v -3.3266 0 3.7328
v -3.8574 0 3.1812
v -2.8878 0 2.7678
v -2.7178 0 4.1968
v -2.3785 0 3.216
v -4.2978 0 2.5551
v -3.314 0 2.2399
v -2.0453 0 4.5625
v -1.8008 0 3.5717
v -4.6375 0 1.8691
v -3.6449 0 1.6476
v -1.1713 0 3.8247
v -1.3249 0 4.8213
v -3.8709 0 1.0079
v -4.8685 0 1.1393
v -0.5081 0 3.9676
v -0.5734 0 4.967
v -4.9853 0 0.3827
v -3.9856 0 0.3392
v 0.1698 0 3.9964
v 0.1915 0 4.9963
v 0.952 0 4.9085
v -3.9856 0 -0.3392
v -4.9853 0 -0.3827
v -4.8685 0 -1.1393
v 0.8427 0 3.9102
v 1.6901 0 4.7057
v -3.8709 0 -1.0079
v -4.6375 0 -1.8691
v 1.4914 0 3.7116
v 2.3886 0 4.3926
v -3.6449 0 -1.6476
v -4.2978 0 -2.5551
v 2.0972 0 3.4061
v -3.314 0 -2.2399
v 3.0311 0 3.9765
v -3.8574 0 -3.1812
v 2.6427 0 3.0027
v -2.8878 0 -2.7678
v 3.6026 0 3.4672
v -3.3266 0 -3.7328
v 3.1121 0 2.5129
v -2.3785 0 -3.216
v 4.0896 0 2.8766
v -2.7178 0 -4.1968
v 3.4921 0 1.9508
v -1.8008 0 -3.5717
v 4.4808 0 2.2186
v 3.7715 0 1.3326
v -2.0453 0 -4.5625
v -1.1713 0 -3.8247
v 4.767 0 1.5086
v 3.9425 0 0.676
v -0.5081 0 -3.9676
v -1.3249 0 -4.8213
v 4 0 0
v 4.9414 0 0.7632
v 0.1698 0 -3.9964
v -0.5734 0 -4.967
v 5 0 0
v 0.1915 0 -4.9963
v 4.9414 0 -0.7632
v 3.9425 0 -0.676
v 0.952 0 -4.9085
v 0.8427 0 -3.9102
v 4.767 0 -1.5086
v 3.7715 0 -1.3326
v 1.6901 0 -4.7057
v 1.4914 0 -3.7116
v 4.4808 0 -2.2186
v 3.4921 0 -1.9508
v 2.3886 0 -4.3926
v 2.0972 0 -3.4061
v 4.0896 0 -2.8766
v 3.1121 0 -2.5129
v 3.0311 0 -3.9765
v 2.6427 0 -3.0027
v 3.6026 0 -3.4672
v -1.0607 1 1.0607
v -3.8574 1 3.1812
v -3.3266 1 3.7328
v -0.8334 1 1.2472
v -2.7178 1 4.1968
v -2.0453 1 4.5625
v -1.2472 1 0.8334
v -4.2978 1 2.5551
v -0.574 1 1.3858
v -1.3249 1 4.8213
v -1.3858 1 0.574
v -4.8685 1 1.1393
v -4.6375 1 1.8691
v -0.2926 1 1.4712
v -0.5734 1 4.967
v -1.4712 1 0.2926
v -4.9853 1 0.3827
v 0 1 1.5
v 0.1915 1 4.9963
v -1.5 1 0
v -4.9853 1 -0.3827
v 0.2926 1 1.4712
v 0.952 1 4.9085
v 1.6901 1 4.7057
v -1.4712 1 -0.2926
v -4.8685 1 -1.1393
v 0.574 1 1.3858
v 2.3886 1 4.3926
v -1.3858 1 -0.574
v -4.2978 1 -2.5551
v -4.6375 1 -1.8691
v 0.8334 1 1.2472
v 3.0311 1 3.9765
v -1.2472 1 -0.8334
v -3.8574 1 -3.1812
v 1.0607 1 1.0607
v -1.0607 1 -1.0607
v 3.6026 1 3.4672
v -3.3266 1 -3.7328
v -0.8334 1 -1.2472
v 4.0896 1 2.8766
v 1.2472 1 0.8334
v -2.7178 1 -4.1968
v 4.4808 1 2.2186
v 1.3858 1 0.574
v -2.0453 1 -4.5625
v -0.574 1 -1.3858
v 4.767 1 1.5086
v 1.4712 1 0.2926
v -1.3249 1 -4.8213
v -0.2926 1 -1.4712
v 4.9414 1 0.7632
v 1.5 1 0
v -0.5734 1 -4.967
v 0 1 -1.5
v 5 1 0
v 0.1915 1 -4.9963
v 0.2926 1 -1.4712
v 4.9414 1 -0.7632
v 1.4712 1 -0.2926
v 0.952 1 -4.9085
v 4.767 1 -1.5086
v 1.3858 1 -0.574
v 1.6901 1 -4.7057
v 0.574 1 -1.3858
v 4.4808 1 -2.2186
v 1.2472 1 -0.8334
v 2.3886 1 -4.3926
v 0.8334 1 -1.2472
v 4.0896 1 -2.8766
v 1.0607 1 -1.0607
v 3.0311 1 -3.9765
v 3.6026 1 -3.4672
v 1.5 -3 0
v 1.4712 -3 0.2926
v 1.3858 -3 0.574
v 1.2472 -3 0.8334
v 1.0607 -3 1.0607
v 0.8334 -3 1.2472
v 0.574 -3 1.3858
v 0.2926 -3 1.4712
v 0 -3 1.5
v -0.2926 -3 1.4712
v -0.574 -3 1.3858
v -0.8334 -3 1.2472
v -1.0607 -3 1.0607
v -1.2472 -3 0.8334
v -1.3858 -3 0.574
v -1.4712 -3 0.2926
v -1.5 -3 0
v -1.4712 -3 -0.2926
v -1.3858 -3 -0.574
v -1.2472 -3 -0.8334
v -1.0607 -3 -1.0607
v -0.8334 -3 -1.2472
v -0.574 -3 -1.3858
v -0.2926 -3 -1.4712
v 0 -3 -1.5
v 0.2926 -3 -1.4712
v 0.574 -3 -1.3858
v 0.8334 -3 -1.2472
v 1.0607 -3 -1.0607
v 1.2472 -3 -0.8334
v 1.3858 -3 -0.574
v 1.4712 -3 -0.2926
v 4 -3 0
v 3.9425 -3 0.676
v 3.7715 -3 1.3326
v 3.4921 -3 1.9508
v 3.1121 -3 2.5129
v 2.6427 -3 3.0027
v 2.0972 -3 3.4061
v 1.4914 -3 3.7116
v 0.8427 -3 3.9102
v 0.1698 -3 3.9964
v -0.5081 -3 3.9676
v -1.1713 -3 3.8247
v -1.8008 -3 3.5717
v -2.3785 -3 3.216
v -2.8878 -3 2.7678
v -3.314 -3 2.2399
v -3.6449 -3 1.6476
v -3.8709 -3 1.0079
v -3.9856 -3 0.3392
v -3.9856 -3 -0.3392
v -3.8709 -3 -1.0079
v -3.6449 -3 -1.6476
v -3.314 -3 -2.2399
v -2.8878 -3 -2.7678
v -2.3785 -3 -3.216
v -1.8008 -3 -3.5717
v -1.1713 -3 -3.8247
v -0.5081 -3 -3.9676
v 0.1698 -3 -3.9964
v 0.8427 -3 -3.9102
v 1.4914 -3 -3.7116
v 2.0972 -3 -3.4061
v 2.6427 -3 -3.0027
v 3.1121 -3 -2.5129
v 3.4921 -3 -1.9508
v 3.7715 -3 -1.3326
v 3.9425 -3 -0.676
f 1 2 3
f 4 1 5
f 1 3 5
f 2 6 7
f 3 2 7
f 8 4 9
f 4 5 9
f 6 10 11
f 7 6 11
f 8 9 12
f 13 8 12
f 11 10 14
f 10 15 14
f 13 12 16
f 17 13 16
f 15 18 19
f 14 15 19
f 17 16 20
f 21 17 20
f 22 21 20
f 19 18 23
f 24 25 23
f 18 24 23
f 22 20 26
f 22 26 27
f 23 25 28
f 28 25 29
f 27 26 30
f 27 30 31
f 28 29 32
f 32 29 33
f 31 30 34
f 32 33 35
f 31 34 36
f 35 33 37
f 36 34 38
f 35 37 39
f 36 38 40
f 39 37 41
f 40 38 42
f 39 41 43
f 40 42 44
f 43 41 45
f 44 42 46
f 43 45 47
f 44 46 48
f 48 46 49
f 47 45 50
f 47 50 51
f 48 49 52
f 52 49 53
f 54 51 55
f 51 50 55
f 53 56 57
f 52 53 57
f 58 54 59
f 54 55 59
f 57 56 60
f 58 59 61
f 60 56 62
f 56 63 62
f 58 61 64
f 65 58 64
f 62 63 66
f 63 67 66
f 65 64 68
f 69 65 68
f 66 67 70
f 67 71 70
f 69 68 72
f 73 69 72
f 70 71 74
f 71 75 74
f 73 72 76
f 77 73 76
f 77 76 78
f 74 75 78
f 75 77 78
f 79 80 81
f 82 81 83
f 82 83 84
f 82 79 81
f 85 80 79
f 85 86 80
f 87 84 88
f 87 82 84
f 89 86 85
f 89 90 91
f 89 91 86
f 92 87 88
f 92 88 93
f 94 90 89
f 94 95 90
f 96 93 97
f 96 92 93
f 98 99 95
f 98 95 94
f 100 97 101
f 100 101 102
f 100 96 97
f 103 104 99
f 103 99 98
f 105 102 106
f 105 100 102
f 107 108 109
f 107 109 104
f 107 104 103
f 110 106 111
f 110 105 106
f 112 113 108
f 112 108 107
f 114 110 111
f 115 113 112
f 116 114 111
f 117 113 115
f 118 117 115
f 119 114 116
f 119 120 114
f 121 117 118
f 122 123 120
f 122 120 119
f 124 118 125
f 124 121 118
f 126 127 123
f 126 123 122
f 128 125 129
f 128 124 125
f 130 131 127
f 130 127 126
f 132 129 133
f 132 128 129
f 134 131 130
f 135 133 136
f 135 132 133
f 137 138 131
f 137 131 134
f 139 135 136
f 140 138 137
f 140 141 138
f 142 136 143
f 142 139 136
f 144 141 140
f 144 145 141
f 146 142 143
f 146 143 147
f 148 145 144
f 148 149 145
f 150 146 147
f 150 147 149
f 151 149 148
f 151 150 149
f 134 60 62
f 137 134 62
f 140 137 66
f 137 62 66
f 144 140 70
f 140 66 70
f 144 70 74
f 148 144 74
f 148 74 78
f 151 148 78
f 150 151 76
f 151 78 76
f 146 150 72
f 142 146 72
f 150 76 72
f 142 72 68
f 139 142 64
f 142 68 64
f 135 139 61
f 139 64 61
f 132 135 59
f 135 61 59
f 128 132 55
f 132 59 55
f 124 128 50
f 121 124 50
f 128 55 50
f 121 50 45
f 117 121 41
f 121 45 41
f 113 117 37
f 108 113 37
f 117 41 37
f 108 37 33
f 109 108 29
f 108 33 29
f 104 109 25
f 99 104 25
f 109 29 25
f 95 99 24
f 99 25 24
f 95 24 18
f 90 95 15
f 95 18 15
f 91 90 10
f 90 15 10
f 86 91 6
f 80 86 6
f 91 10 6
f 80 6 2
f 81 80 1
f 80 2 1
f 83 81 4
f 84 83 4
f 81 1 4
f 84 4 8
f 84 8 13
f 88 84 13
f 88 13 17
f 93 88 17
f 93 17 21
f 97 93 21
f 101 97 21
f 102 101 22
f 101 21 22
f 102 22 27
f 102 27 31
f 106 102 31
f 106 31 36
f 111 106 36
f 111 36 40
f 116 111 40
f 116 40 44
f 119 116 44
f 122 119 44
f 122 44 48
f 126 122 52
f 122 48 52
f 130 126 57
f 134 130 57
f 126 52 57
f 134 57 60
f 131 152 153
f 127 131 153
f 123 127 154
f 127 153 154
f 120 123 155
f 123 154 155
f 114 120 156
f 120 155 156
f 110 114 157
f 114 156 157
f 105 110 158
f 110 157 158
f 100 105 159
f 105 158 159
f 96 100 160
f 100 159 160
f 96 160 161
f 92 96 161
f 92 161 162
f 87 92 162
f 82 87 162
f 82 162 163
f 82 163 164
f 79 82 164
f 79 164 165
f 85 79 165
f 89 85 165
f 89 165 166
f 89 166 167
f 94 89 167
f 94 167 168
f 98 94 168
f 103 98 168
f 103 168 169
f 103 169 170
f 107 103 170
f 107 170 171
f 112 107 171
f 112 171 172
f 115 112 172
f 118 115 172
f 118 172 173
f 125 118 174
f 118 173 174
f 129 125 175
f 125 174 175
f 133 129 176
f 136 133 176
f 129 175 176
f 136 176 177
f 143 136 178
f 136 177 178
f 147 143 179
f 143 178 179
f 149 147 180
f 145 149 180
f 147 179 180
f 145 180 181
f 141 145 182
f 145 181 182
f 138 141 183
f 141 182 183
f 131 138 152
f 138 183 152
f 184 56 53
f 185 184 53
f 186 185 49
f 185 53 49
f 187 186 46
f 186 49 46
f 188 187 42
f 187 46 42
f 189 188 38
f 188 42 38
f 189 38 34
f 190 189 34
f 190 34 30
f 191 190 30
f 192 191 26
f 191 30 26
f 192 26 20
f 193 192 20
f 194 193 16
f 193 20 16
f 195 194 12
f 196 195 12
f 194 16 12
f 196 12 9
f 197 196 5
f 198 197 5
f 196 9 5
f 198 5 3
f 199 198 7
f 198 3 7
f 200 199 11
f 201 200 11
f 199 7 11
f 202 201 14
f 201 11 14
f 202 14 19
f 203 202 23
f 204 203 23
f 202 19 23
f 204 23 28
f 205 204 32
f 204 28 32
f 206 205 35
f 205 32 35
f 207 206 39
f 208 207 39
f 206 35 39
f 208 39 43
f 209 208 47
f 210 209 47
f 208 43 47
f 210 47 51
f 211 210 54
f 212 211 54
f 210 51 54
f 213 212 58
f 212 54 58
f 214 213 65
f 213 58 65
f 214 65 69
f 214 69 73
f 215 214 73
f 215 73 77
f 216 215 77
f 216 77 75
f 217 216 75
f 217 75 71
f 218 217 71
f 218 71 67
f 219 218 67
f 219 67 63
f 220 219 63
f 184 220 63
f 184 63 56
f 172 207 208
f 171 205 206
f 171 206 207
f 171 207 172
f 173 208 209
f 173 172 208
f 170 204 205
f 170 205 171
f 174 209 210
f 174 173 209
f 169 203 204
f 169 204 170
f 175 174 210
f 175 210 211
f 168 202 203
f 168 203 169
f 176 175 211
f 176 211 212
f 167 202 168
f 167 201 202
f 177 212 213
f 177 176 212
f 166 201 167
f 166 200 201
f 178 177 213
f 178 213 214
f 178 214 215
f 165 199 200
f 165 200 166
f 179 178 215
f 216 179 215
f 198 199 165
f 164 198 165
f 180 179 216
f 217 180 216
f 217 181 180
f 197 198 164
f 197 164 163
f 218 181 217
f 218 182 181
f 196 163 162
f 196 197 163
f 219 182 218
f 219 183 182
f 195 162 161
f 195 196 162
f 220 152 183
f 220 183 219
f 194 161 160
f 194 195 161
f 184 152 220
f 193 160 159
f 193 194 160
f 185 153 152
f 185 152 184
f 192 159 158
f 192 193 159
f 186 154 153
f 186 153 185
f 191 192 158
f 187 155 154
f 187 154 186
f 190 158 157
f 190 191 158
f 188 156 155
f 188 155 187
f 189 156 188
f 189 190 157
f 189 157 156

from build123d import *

# Parameters (mm, degrees)
SKETCH1_R           = 5
BOSS_EXTRUDE1_DEPTH = 1
SKETCH2_R           = 4
BOSS_EXTRUDE2_DEPTH = 3
SKETCH3_R           = 1.5
CUT_EXTRUDE1_DEPTH  = 13


with BuildPart() as part:
    # Sketch1 → Boss-Extrude1 (new body)
    with BuildSketch(Plane(origin=(0, 0, 0), x_dir=(1, 0, 0), z_dir=(0, 1, 0))):
        Circle(SKETCH1_R)
    extrude(amount=BOSS_EXTRUDE1_DEPTH)

    # Sketch2 → Boss-Extrude2 (add)
    with BuildSketch(Plane.XZ):
        Circle(SKETCH2_R)
    extrude(amount=BOSS_EXTRUDE2_DEPTH)

    # Sketch3 → Cut-Extrude1 (cut)
    with BuildSketch(Plane.XZ.offset(3)):
        Circle(SKETCH3_R)
    extrude(amount=-CUT_EXTRUDE1_DEPTH, mode=Mode.SUBTRACT)


solid = part.part
